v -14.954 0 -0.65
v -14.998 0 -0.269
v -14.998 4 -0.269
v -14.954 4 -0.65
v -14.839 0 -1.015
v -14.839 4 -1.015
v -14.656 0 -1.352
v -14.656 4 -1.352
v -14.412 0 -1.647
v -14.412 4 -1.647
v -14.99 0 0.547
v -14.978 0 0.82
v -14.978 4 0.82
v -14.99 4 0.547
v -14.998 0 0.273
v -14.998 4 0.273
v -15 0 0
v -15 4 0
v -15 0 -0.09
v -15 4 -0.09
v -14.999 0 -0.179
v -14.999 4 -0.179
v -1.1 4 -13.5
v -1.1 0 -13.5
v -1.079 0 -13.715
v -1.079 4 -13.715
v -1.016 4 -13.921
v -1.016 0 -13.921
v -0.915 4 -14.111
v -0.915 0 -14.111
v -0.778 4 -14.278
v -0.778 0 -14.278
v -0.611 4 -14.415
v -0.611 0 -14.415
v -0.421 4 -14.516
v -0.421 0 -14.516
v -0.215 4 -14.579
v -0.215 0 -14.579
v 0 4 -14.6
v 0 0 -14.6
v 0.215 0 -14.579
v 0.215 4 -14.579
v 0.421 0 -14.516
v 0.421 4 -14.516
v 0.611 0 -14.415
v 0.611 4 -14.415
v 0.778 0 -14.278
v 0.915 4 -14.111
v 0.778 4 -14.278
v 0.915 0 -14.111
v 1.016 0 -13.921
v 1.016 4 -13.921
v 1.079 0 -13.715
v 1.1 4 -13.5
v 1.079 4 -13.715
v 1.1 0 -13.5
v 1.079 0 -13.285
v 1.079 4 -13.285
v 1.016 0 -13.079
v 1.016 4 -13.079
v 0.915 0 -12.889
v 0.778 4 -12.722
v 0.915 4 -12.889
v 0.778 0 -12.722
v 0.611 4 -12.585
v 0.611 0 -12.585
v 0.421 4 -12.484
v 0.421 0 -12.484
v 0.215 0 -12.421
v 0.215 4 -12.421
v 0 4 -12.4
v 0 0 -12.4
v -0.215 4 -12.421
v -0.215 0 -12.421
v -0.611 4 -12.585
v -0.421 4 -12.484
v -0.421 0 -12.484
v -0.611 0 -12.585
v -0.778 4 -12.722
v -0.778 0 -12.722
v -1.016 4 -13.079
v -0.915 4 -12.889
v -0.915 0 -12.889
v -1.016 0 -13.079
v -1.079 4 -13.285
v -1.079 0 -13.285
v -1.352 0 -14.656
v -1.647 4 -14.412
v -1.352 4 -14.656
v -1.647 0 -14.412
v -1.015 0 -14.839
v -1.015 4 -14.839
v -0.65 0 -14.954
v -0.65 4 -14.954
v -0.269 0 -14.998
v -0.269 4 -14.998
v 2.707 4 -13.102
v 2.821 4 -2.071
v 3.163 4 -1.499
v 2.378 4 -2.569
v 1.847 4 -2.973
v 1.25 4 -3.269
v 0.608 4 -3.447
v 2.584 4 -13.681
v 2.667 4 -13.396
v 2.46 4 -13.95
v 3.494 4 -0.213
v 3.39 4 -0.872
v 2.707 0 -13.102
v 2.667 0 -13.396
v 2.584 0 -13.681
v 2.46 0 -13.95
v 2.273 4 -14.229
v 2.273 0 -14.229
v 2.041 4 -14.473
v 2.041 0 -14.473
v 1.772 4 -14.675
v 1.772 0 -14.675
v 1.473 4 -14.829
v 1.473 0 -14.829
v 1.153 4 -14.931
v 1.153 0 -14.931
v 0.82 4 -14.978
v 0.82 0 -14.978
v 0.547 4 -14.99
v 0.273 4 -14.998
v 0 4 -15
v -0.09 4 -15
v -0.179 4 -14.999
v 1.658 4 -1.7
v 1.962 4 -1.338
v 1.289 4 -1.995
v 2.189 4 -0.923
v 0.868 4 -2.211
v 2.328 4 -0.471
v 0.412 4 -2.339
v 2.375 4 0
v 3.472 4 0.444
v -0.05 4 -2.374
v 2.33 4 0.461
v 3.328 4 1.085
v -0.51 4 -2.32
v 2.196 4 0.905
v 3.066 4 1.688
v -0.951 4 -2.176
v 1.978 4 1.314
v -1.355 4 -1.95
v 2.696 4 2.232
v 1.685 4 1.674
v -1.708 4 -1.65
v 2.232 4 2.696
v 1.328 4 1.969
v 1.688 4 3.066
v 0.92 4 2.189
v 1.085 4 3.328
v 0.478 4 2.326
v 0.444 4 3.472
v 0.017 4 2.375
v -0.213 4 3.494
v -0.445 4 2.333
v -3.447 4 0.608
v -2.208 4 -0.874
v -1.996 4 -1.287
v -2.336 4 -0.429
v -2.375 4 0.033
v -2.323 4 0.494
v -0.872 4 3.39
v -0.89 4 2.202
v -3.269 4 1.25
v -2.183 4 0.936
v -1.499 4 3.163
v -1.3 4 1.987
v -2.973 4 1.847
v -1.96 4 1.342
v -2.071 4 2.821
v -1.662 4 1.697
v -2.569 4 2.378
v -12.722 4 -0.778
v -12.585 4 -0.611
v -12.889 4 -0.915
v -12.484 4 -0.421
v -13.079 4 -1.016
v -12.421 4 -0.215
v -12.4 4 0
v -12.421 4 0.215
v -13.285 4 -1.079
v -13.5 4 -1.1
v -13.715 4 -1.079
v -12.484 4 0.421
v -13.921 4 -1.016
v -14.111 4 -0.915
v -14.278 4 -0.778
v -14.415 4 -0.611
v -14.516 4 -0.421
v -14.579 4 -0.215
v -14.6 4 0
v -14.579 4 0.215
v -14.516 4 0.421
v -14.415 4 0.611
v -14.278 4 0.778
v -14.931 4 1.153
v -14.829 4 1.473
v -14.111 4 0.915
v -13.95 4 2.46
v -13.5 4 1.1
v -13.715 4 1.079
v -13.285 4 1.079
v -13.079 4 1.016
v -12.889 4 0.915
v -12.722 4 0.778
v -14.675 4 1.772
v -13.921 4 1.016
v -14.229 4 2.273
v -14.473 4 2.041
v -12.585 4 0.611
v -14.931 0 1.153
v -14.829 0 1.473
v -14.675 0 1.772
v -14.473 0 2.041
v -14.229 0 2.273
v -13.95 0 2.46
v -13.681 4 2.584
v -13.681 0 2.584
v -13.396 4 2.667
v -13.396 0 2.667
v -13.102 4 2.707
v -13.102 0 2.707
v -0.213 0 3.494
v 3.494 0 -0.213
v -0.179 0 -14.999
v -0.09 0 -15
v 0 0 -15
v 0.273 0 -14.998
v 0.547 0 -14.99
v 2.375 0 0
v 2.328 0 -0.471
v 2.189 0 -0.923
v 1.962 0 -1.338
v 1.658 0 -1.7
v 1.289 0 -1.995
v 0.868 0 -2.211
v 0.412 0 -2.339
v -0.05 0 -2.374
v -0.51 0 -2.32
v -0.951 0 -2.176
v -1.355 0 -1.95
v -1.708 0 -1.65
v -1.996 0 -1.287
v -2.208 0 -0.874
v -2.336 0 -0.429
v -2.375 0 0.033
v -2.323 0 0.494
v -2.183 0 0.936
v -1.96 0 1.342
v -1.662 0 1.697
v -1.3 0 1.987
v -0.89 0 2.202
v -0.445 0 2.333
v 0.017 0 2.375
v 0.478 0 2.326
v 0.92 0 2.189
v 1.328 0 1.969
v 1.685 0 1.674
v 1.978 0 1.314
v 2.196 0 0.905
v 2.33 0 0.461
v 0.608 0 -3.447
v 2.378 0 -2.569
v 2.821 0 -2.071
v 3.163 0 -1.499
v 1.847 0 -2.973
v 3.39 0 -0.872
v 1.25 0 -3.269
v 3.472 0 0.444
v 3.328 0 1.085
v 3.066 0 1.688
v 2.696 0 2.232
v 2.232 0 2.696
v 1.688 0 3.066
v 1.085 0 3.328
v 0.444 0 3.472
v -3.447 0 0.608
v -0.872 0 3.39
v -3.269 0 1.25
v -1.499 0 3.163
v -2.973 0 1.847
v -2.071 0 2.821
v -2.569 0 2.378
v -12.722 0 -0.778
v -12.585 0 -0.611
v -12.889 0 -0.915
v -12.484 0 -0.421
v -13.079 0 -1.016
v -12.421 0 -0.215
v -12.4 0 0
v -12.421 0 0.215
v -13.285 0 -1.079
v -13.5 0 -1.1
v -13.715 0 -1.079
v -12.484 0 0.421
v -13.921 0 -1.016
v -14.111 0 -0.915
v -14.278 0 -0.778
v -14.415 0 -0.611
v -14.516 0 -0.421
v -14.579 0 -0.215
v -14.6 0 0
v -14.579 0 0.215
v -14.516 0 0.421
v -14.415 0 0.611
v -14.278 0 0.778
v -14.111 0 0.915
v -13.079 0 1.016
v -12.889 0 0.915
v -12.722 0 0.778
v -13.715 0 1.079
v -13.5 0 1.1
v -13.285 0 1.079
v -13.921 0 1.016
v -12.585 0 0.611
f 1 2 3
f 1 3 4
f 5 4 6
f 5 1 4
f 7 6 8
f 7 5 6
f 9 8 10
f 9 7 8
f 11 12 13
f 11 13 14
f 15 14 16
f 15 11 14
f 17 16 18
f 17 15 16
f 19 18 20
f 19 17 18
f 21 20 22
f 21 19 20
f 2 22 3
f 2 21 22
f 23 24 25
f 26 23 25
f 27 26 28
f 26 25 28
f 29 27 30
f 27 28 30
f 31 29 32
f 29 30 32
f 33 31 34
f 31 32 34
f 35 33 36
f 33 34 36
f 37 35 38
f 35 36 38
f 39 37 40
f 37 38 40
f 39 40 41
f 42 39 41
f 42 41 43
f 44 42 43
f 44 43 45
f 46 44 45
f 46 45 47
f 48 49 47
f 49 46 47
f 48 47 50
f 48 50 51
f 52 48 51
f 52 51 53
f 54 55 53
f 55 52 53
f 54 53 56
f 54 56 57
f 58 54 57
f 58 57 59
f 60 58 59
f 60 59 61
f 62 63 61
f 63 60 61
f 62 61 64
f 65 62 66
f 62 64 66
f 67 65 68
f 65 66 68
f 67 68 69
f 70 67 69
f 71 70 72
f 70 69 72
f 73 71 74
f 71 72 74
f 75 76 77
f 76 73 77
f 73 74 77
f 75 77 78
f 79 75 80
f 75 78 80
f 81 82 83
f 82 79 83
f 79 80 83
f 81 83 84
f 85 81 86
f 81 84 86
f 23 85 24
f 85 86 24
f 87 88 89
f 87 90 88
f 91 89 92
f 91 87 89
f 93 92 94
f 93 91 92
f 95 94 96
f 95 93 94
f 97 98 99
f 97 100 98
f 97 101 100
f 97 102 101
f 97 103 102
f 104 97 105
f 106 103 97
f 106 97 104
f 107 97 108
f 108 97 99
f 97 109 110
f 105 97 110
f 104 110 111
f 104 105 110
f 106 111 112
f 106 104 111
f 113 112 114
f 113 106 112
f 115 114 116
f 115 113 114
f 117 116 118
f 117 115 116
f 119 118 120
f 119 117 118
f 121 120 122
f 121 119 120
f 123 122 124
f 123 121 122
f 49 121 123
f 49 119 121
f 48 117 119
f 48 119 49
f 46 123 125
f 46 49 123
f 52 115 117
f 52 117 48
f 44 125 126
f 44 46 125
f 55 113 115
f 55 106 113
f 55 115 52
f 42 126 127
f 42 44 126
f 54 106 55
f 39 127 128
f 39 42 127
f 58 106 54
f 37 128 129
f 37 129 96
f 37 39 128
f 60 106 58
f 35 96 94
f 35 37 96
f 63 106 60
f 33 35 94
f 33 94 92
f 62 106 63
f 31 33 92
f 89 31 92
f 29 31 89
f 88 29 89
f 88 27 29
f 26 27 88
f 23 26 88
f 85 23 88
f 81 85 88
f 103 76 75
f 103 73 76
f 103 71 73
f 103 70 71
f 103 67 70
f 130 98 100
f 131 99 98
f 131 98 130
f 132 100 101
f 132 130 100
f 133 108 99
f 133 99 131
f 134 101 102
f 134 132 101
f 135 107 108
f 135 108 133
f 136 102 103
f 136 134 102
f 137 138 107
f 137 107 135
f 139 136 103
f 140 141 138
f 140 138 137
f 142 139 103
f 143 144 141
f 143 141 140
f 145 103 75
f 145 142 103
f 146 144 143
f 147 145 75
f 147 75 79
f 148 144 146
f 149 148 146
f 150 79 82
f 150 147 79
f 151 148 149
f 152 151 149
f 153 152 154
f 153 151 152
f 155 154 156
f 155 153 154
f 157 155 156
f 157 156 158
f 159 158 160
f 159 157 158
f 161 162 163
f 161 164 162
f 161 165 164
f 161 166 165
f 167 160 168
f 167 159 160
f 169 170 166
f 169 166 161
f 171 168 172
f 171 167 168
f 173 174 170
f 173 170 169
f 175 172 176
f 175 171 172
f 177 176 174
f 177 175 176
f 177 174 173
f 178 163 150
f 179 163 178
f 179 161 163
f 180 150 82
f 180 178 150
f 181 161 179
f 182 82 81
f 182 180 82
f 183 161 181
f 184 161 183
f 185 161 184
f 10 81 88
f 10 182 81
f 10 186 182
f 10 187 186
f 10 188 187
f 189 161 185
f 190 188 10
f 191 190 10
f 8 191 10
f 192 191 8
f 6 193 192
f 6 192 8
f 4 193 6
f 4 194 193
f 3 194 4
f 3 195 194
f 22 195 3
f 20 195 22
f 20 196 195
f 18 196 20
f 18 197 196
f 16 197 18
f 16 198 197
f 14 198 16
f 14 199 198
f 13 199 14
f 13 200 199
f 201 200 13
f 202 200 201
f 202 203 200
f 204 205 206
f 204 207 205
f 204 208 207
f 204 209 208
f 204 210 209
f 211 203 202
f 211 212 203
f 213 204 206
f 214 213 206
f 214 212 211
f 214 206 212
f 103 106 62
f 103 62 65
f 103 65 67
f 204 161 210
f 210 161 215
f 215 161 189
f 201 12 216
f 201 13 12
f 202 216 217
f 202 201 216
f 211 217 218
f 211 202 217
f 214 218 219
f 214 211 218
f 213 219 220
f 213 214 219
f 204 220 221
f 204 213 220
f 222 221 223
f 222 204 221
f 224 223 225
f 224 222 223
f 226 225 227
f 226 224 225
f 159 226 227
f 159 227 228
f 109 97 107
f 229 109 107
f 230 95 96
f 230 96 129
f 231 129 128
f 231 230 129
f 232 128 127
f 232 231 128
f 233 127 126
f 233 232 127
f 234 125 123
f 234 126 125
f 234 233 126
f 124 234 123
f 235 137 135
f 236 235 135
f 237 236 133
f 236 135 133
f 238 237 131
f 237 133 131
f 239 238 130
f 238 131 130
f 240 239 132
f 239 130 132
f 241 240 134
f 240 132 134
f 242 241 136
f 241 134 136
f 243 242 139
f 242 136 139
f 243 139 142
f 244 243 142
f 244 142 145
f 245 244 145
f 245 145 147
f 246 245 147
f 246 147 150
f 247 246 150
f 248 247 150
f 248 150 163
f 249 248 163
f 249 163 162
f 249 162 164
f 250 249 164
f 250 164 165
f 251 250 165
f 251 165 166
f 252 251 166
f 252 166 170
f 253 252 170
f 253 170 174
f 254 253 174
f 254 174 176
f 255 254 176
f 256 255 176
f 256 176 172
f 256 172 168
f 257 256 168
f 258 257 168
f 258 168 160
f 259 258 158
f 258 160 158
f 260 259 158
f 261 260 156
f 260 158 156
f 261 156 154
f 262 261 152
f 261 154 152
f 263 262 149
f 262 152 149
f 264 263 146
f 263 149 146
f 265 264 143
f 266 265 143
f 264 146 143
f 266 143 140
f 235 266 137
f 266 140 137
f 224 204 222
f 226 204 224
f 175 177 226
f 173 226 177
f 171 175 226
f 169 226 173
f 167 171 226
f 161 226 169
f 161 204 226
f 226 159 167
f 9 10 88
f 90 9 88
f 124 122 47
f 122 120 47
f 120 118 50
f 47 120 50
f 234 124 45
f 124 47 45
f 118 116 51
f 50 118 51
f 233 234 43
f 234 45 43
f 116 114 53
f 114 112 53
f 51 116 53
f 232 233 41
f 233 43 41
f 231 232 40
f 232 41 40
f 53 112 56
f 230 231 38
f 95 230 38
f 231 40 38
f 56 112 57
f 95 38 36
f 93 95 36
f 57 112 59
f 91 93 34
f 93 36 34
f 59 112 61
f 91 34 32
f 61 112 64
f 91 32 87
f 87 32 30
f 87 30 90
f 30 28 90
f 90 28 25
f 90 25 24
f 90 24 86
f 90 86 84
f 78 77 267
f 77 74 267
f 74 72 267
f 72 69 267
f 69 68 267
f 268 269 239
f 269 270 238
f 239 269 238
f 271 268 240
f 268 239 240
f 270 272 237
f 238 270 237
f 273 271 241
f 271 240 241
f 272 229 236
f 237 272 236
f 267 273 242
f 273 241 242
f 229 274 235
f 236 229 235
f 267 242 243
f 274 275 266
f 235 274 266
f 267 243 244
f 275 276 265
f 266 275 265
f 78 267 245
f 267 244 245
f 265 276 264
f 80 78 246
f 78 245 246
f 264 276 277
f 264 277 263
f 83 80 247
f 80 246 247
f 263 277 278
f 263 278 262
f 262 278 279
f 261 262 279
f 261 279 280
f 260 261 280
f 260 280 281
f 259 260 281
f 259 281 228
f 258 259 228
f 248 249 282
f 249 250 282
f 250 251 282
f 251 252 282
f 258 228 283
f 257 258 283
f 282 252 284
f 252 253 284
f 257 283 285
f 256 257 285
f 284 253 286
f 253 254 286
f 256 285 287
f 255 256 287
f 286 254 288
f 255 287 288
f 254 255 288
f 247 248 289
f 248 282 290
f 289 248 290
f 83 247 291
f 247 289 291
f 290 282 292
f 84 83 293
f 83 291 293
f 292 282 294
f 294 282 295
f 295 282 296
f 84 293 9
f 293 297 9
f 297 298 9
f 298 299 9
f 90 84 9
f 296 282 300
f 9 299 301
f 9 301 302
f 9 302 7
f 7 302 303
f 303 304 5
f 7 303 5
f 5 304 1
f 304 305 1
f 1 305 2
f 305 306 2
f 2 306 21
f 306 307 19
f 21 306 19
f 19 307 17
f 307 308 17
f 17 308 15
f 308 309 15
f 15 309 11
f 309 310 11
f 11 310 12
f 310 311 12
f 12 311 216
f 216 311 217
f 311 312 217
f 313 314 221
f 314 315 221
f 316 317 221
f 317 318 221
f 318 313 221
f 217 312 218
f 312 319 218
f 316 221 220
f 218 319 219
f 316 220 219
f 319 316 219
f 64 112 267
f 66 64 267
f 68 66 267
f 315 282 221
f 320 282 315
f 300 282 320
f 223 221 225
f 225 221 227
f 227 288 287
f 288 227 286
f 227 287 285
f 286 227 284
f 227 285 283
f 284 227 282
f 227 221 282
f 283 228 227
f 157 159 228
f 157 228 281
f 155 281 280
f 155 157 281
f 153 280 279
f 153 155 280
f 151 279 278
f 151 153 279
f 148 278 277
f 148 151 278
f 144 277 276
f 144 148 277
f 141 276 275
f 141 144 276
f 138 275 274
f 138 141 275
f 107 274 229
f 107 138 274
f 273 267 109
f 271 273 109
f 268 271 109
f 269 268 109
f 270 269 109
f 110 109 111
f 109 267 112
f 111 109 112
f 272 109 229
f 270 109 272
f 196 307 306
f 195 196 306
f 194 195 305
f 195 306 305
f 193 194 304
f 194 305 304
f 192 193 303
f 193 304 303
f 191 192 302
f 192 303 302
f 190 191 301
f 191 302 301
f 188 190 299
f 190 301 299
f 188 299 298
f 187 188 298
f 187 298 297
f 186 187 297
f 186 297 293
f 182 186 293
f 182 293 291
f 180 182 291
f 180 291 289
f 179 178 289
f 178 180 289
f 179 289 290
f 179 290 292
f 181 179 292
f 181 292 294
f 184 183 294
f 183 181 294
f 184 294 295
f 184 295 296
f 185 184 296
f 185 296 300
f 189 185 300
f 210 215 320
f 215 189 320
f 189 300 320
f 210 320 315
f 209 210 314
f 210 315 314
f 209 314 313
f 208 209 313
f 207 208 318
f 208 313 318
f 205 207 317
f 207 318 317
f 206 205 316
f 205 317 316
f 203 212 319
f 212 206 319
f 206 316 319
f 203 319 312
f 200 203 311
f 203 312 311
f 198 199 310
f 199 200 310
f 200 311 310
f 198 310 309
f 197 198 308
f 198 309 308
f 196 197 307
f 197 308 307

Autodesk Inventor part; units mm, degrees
ref_plane "YZ Plane" through (0, 0, 0) normal (1, 0, 0) x (0, 1, 0)
ref_plane "XZ Plane" through (0, 0, 0) normal (0, 1, 0) x (-1, 0, 0)
ref_plane "XY Plane" through (0, 0, 0) normal (0, 0, 1) x (1, 0, 0)
sketch "Sketch1" plane through (0, 0, 0) normal (0, 1, 0) x (-1, 0, 0)
  circle A0 centre (0, 0) radius 15
  line L0 (0, 0) -> (14.7721, 2.6047)
  line L1 (0, 0) -> (15, 0) construction
  line L2 (0, 0) -> (-2.6047, -14.7721)
  line L3 (0, 0) -> (15, 0) construction
  line L4 (15, 0) -> (13.5, 0)
  circle A1 centre (13.5, 0) radius 1.1
  line L5 (0, -15) -> (0, -13.5)
  circle A2 centre (0, -13.5) radius 1.1
  dimension "d0" = 30
  dimension "d1" = 10
  dimension "d2" = 100
  dimension "d3" = 1.5
  dimension "d4" = 2.2
  dimension "d5" = 1.5
  dimension "d6" = 2.2
extrude "Extrusion1" add sketch "Sketch1" along normal blind 4 contours A0 L2 L0 picked at (8.0845, -3.2878)
sketch "Sketch2" plane through (0, 4, 0) normal (0, 1, 0) x (1, 0, 0)
  line L0 (0, 0) -> (2.6047, 14.7721) projected
  circle A0 centre (0, 0) radius 1
  dimension "d9" = 2
extrude "Extrusion2" cut sketch "Sketch2" against normal blind 4
sketch "Sketch3" plane through (0, 4, 0) normal (0, 1, 0) x (1, 0, 0)
  circle A0 centre (0, 0) radius 2.375
  dimension "d12" = 4.75
extrude "Extrusion3" cut sketch "Sketch3" against normal blind 10
sketch "Sketch4" plane through (0, 4, 0) normal (0, 1, 0) x (1, 0, 0)
  circle A0 centre (0, 0) radius 3.5
  line L0 (0.4124, 2.3389) -> (2.6047, 14.7721) projected
  circle A1 centre (0, 0) radius 2.375
  dimension "d15" = 7
extrude "Extrusion4" add sketch "Sketch4" against normal blind 4
sketch "Sketch5" plane through (0, 4, 0) normal (0, 1, 0) x (1, 0, 0)
  arc A0 (2.6047, 14.7721) -> (-14.7721, -2.6047) centre (0, 0) ccw projected
  line L0 (2.6047, 14.7721) -> (3.4935, 0.2133)
  arc A1 (-3.4468, -0.6078) -> (0.6078, 3.4468) centre (0, 0) ccw projected
  line L1 (-14.7721, -2.6047) -> (-3.4468, -0.6078) projected
  line L2 (-14.7721, -2.6047) -> (-0.2133, -3.4935)
  line L3 (-14.7721, -2.6047) -> (-3.4468, -0.6078)
  line L4 (0.6078, 3.4468) -> (2.6047, 14.7721) projected
  line L5 (2.6047, 14.7721) -> (0.6078, 3.4468)
  circle A2 centre (0, 0) radius 3.5
extrude "Extrusion5" add sketch "Sketch5" against normal blind 4 contours L0 A1 L4 | L1 A1 L2
fillet "Fillet1" radius 2 2 edges at (-14.7721, 2, 2.6047) (2.6047, 2, -14.7721)
sketch "Sketch6" plane through (0, 4, 0) normal (0, 1, 0) x (1, 0, 0)
  circle A0 centre (0, 13.5) radius 1.1 projected
  line L0 (-1.1, 13.5) -> (-1.1, 18.6359)
  circle A1 centre (-13.5, 0) radius 1.1 projected
  line L1 (-13.5, 1.1) -> (-18.0154, 1.1)
  arc A2 (0.8197, 14.9776) -> (-14.9776, -0.8197) centre (0, 0) ccw projected
  line L2 (-14.9596, 1.1) -> (-1.1, 14.9596)
  line L3 (-1.1, 14.9596) -> (-5.2086, 18.0633)
  line L4 (-5.2086, 18.0633) -> (-18.2073, 3.056)
  line L5 (-18.2073, 3.056) -> (-14.9596, 1.1)
extrude "Extrusion6" cut sketch "Sketch6" against normal blind 40 contours L2 A2
fillet "Fillet2" radius 2 2 edges at (-14.9596, 2, -1.1) (-1.1, 2, -14.9596)
properties part number "bell_crank_v1"
